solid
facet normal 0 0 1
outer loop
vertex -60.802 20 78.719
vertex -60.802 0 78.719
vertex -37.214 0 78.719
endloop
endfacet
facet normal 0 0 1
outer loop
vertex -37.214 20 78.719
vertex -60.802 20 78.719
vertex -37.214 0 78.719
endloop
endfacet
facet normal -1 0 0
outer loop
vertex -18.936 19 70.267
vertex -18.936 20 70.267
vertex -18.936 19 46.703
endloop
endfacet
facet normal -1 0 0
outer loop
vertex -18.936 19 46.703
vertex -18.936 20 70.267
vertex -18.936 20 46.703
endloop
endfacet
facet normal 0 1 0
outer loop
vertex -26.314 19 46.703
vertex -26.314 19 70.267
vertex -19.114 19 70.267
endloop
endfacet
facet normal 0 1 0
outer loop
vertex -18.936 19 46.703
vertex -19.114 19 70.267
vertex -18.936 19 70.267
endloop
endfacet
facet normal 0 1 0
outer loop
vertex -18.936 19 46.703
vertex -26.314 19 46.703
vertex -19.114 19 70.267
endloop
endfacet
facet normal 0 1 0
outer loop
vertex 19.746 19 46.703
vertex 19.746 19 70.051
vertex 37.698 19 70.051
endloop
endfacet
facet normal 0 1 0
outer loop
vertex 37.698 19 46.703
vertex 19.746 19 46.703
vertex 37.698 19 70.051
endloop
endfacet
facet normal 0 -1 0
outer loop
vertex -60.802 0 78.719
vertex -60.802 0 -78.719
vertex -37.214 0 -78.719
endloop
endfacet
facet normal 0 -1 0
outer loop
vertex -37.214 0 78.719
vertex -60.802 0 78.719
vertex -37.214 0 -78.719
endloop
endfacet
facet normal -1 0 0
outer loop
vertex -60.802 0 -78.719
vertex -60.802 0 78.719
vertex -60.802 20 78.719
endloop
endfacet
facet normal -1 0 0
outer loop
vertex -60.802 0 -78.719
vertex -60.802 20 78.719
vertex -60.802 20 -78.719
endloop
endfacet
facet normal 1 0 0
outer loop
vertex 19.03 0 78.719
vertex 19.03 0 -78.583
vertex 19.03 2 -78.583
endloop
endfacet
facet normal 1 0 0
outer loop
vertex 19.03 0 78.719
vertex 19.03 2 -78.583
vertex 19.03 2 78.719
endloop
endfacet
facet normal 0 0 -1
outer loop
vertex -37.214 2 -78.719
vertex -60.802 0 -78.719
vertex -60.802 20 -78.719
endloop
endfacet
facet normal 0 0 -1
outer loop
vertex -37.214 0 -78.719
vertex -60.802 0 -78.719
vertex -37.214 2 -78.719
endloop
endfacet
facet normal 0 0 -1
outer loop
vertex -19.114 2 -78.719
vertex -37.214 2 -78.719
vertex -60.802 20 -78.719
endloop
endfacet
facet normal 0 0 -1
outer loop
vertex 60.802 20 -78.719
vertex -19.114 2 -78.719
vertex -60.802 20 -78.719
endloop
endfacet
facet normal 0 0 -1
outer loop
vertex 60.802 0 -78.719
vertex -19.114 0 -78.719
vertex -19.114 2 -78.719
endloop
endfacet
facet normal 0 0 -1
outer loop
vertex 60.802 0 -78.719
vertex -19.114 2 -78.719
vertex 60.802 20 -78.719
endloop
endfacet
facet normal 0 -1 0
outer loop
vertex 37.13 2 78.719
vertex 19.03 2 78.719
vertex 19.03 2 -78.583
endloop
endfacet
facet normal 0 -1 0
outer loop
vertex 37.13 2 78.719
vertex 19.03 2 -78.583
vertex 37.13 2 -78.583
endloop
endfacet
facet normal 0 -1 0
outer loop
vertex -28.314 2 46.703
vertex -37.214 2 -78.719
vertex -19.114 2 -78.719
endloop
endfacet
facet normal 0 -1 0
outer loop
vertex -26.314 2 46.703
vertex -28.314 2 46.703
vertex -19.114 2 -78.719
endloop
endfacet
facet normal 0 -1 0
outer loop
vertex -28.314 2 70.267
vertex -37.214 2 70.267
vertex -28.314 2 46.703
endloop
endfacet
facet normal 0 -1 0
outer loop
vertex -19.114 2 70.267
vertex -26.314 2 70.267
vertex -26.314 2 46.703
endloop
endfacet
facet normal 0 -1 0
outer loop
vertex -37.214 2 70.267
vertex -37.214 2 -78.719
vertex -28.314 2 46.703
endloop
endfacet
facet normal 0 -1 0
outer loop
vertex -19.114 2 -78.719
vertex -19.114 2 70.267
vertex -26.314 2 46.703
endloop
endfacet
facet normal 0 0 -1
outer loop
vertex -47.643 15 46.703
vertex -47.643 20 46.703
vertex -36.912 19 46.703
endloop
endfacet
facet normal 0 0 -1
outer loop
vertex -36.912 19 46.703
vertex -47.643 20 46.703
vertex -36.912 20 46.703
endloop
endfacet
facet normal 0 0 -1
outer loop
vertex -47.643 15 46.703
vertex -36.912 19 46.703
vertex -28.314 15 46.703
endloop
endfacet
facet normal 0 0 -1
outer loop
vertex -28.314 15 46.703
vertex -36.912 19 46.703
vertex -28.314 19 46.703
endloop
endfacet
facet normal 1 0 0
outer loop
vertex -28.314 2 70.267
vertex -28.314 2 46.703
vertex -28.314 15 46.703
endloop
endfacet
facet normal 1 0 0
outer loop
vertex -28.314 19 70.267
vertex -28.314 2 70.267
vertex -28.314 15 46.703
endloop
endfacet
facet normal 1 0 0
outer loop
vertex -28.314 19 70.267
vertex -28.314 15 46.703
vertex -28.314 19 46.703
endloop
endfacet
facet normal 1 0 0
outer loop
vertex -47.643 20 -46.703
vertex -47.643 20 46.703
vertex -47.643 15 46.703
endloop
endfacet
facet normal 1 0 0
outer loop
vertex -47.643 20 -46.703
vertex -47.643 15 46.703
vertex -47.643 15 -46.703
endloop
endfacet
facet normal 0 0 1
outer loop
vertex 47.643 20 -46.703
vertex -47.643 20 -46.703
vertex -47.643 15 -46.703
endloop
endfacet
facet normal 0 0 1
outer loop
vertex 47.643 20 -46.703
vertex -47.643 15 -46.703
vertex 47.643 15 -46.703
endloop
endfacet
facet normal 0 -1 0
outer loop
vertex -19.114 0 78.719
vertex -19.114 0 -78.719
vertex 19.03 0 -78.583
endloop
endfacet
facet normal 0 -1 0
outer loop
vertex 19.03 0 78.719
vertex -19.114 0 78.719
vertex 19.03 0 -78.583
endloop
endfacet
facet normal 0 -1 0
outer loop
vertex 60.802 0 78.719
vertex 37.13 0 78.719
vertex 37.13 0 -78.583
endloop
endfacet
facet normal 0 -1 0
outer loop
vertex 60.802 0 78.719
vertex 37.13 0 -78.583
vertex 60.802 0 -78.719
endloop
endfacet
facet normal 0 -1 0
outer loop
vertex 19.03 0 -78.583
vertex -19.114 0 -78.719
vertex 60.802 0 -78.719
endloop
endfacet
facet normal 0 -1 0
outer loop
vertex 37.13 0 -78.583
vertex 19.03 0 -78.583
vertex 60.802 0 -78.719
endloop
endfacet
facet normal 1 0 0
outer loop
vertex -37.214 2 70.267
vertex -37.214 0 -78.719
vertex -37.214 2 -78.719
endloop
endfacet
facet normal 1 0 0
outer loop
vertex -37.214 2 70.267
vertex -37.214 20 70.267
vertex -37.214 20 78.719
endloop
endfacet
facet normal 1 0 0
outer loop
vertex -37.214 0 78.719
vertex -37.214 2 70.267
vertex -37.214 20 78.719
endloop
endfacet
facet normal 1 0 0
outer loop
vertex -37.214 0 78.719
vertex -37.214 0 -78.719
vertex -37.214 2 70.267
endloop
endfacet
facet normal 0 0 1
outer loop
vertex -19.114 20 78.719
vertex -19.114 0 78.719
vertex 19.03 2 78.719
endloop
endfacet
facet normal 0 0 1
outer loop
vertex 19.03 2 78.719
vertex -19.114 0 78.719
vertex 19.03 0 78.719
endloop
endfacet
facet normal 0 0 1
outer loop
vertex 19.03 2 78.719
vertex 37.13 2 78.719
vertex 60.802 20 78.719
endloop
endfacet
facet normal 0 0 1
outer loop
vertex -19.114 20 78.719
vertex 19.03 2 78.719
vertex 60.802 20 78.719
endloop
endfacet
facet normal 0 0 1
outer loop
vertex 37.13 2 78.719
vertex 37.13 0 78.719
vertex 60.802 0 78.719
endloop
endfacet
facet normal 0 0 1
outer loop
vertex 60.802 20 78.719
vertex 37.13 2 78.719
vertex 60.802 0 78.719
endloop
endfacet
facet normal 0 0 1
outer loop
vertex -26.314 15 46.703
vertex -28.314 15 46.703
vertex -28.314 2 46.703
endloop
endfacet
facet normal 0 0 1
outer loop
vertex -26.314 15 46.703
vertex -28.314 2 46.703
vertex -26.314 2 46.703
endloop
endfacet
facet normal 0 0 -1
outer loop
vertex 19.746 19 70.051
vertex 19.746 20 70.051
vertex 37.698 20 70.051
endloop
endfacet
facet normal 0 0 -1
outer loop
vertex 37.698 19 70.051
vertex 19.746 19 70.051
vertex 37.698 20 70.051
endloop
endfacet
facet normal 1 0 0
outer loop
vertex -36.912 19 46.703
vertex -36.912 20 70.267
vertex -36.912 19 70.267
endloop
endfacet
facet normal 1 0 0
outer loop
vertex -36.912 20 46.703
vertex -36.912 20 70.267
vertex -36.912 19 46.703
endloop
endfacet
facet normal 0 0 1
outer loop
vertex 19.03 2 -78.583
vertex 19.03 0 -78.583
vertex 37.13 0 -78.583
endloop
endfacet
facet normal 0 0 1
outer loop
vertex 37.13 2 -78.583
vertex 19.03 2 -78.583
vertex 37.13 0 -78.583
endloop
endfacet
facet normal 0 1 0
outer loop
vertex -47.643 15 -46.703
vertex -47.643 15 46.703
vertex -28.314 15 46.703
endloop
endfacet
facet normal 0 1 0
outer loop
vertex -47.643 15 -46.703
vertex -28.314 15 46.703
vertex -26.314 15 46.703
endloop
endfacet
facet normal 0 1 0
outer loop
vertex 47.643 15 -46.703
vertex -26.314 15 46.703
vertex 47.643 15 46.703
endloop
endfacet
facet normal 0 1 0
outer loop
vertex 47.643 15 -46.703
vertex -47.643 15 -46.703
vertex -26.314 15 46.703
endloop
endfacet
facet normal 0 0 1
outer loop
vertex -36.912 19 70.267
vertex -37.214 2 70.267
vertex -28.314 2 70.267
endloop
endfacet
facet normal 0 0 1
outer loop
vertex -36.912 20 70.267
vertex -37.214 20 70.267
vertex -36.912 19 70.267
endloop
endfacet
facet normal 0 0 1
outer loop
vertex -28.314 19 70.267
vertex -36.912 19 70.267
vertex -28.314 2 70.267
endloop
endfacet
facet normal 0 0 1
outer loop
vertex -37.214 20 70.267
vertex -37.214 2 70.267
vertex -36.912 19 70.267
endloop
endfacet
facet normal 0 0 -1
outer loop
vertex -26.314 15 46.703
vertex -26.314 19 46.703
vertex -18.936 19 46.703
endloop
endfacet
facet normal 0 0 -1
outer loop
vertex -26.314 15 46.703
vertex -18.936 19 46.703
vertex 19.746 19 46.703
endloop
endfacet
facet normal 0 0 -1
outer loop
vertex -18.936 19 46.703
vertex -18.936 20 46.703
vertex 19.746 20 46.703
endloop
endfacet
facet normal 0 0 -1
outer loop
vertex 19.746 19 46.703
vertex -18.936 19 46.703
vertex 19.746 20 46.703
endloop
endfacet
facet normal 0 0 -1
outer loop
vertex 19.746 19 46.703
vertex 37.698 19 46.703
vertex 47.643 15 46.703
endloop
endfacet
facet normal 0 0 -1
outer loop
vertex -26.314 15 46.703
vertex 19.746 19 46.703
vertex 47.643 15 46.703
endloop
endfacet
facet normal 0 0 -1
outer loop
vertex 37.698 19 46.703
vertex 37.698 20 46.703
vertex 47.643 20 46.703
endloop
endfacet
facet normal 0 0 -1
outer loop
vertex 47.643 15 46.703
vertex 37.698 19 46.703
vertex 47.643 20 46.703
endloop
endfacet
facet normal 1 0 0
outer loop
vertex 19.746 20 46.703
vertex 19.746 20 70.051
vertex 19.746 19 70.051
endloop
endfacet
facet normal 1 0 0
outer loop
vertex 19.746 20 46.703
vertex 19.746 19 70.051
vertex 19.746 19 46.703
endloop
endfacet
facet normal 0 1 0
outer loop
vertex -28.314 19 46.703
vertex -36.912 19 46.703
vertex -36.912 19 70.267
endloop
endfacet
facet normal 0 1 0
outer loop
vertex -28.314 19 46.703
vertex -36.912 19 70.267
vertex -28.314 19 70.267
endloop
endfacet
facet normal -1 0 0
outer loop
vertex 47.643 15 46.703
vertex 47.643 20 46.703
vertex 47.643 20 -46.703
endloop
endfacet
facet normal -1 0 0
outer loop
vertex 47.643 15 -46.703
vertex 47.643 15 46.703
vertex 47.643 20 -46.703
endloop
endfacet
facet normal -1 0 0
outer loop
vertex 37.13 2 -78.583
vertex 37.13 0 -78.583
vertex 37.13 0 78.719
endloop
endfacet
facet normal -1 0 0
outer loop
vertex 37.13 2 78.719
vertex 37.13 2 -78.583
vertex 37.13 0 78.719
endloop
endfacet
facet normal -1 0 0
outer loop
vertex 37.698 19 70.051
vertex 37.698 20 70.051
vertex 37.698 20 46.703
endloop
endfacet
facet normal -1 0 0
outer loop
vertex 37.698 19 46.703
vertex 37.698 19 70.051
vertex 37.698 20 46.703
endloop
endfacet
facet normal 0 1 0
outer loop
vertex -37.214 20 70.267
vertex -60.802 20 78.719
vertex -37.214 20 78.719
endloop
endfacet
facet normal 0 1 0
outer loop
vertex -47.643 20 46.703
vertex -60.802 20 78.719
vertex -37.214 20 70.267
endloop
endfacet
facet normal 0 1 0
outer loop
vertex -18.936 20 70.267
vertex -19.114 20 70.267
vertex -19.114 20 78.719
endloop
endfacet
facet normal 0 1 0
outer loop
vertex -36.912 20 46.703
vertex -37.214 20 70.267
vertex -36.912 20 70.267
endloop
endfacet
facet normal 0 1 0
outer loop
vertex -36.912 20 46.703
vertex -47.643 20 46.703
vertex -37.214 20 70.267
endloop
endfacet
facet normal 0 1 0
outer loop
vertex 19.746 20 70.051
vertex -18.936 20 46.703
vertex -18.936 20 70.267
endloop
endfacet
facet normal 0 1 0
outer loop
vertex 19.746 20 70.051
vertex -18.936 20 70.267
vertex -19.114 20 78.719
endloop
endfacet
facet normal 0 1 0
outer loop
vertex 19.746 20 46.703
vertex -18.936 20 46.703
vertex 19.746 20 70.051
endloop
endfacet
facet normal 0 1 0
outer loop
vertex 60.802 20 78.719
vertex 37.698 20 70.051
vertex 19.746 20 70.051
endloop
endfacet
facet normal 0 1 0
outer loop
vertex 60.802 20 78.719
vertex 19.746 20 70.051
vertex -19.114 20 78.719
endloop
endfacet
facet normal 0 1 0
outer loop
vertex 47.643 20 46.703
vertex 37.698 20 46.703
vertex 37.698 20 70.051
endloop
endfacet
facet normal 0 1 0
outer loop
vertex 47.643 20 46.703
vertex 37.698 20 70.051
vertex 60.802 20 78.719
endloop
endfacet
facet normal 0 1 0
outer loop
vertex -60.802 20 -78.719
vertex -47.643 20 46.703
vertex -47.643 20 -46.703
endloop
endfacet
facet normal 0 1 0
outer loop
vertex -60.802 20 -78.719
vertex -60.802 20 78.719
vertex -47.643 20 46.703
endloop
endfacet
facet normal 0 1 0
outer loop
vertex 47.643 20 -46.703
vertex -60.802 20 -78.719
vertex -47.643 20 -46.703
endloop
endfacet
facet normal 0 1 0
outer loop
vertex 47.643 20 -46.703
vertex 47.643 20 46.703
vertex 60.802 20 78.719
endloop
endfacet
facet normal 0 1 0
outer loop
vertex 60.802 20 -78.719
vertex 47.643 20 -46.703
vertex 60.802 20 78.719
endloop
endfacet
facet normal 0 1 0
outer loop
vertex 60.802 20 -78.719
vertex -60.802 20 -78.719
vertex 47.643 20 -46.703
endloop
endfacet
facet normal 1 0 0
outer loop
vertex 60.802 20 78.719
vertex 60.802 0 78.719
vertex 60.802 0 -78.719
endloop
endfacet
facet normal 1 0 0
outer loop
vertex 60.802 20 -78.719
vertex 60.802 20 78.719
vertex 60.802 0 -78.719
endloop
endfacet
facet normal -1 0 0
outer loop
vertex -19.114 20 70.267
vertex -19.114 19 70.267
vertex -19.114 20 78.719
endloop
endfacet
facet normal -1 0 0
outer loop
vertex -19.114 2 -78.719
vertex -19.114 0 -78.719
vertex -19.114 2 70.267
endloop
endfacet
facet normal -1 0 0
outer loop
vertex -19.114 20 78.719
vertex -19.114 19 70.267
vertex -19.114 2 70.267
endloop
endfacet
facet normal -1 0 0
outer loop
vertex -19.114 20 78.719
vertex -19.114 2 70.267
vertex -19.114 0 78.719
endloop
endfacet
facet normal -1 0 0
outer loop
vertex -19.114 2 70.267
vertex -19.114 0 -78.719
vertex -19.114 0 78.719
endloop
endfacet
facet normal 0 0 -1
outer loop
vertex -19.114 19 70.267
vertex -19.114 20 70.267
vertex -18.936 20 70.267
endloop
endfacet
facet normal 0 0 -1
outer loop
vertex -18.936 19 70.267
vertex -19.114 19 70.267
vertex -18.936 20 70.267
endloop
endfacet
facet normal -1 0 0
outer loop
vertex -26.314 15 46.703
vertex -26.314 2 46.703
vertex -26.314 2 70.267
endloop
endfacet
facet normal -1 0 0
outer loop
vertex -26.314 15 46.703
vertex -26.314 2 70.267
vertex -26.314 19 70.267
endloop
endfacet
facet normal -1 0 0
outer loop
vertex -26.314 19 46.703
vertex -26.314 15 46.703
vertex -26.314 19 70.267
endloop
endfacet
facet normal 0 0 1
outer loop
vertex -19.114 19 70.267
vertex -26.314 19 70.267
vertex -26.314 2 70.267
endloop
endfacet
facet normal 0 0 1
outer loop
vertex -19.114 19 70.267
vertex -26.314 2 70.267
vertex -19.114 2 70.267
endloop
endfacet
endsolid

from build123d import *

# Parameters (mm, degrees)
SKETCH1_W           = 121.603901538
SKETCH1_H           = 157.438867692
BOSS_EXTRUDE1_DEPTH = 20
SKETCH2_W           = 17.97576728
SKETCH2_H           = 23.568228212
SKETCH2_W_2         = 17.951314889
SKETCH2_H_2         = 23.536168411
CUT_EXTRUDE1_DEPTH  = 1
SKETCH3_W           = 95.285802818
SKETCH3_H           = 93.40563605
CUT_EXTRUDE2_DEPTH  = 5
SKETCH5_W           = 18.1
SKETCH5_H           = 157.438867692
CUT_EXTRUDE3_DEPTH  = 2
SKETCH6_W           = 2
SKETCH6_H           = 18
CUT_EXTRUDE4_DEPTH  = 33
SKETCH8_W           = 18.1
SKETCH8_H           = 18
CUT_EXTRUDE5_DEPTH  = 8.45273398


with BuildPart() as part:
    # Sketch1 → Boss-Extrude1 (new body)
    with BuildSketch(Plane(origin=(0, 0, 0), x_dir=(1, 0, 0), z_dir=(0, 1, 0))):
        Rectangle(SKETCH1_W, SKETCH1_H)
    extrude(amount=BOSS_EXTRUDE1_DEPTH)

    # Sketch2 → Cut-Extrude1 (cut)
    with BuildSketch(Plane(origin=(0, 20, 0), x_dir=(1, 0, 0), z_dir=(0, 1, 0))):
        with Locations((-27.924267606, -58.48258576)):
            Rectangle(SKETCH2_W, SKETCH2_H)
        with Locations((28.722103823, -58.283126705)):
            Rectangle(SKETCH2_W_2, SKETCH2_H_2)
    extrude(amount=-CUT_EXTRUDE1_DEPTH, mode=Mode.SUBTRACT)

    # Sketch3 → Cut-Extrude2 (cut)
    with BuildSketch(Plane(origin=(0, 20, 0), x_dir=(1, 0, 0), z_dir=(0, 1, 0))):
        Rectangle(SKETCH3_W, SKETCH3_H)
    extrude(amount=-CUT_EXTRUDE2_DEPTH, mode=Mode.SUBTRACT)

    # Sketch5 → Cut-Extrude3 (cut)
    with BuildSketch(Plane.XZ):
        with Locations((-28.163629981, 0)):
            Rectangle(SKETCH5_W, SKETCH5_H)
        with Locations((28.080400305, 0.136730642)):
            Rectangle(SKETCH5_W, SKETCH5_H)
    extrude(amount=-CUT_EXTRUDE3_DEPTH, mode=Mode.SUBTRACT)

    # Sketch6 → Cut-Extrude4 (cut)
    with BuildSketch(Plane(origin=(-36.912151246, 20, 46.702818025), x_dir=(1, 0, 0), z_dir=(0, 0, 1))):
        with Locations((9.598521265, -9)):
            Rectangle(SKETCH6_W, SKETCH6_H)
    extrude(amount=CUT_EXTRUDE4_DEPTH, mode=Mode.SUBTRACT)

    # Sketch8 → Cut-Extrude5 (cut)
    with BuildSketch(Plane.XY.offset(78.719433846)):
        with Locations((-28.163629981, 11)):
            Rectangle(SKETCH8_W, SKETCH8_H)
    extrude(amount=-CUT_EXTRUDE5_DEPTH, mode=Mode.SUBTRACT)


solid = part.part
